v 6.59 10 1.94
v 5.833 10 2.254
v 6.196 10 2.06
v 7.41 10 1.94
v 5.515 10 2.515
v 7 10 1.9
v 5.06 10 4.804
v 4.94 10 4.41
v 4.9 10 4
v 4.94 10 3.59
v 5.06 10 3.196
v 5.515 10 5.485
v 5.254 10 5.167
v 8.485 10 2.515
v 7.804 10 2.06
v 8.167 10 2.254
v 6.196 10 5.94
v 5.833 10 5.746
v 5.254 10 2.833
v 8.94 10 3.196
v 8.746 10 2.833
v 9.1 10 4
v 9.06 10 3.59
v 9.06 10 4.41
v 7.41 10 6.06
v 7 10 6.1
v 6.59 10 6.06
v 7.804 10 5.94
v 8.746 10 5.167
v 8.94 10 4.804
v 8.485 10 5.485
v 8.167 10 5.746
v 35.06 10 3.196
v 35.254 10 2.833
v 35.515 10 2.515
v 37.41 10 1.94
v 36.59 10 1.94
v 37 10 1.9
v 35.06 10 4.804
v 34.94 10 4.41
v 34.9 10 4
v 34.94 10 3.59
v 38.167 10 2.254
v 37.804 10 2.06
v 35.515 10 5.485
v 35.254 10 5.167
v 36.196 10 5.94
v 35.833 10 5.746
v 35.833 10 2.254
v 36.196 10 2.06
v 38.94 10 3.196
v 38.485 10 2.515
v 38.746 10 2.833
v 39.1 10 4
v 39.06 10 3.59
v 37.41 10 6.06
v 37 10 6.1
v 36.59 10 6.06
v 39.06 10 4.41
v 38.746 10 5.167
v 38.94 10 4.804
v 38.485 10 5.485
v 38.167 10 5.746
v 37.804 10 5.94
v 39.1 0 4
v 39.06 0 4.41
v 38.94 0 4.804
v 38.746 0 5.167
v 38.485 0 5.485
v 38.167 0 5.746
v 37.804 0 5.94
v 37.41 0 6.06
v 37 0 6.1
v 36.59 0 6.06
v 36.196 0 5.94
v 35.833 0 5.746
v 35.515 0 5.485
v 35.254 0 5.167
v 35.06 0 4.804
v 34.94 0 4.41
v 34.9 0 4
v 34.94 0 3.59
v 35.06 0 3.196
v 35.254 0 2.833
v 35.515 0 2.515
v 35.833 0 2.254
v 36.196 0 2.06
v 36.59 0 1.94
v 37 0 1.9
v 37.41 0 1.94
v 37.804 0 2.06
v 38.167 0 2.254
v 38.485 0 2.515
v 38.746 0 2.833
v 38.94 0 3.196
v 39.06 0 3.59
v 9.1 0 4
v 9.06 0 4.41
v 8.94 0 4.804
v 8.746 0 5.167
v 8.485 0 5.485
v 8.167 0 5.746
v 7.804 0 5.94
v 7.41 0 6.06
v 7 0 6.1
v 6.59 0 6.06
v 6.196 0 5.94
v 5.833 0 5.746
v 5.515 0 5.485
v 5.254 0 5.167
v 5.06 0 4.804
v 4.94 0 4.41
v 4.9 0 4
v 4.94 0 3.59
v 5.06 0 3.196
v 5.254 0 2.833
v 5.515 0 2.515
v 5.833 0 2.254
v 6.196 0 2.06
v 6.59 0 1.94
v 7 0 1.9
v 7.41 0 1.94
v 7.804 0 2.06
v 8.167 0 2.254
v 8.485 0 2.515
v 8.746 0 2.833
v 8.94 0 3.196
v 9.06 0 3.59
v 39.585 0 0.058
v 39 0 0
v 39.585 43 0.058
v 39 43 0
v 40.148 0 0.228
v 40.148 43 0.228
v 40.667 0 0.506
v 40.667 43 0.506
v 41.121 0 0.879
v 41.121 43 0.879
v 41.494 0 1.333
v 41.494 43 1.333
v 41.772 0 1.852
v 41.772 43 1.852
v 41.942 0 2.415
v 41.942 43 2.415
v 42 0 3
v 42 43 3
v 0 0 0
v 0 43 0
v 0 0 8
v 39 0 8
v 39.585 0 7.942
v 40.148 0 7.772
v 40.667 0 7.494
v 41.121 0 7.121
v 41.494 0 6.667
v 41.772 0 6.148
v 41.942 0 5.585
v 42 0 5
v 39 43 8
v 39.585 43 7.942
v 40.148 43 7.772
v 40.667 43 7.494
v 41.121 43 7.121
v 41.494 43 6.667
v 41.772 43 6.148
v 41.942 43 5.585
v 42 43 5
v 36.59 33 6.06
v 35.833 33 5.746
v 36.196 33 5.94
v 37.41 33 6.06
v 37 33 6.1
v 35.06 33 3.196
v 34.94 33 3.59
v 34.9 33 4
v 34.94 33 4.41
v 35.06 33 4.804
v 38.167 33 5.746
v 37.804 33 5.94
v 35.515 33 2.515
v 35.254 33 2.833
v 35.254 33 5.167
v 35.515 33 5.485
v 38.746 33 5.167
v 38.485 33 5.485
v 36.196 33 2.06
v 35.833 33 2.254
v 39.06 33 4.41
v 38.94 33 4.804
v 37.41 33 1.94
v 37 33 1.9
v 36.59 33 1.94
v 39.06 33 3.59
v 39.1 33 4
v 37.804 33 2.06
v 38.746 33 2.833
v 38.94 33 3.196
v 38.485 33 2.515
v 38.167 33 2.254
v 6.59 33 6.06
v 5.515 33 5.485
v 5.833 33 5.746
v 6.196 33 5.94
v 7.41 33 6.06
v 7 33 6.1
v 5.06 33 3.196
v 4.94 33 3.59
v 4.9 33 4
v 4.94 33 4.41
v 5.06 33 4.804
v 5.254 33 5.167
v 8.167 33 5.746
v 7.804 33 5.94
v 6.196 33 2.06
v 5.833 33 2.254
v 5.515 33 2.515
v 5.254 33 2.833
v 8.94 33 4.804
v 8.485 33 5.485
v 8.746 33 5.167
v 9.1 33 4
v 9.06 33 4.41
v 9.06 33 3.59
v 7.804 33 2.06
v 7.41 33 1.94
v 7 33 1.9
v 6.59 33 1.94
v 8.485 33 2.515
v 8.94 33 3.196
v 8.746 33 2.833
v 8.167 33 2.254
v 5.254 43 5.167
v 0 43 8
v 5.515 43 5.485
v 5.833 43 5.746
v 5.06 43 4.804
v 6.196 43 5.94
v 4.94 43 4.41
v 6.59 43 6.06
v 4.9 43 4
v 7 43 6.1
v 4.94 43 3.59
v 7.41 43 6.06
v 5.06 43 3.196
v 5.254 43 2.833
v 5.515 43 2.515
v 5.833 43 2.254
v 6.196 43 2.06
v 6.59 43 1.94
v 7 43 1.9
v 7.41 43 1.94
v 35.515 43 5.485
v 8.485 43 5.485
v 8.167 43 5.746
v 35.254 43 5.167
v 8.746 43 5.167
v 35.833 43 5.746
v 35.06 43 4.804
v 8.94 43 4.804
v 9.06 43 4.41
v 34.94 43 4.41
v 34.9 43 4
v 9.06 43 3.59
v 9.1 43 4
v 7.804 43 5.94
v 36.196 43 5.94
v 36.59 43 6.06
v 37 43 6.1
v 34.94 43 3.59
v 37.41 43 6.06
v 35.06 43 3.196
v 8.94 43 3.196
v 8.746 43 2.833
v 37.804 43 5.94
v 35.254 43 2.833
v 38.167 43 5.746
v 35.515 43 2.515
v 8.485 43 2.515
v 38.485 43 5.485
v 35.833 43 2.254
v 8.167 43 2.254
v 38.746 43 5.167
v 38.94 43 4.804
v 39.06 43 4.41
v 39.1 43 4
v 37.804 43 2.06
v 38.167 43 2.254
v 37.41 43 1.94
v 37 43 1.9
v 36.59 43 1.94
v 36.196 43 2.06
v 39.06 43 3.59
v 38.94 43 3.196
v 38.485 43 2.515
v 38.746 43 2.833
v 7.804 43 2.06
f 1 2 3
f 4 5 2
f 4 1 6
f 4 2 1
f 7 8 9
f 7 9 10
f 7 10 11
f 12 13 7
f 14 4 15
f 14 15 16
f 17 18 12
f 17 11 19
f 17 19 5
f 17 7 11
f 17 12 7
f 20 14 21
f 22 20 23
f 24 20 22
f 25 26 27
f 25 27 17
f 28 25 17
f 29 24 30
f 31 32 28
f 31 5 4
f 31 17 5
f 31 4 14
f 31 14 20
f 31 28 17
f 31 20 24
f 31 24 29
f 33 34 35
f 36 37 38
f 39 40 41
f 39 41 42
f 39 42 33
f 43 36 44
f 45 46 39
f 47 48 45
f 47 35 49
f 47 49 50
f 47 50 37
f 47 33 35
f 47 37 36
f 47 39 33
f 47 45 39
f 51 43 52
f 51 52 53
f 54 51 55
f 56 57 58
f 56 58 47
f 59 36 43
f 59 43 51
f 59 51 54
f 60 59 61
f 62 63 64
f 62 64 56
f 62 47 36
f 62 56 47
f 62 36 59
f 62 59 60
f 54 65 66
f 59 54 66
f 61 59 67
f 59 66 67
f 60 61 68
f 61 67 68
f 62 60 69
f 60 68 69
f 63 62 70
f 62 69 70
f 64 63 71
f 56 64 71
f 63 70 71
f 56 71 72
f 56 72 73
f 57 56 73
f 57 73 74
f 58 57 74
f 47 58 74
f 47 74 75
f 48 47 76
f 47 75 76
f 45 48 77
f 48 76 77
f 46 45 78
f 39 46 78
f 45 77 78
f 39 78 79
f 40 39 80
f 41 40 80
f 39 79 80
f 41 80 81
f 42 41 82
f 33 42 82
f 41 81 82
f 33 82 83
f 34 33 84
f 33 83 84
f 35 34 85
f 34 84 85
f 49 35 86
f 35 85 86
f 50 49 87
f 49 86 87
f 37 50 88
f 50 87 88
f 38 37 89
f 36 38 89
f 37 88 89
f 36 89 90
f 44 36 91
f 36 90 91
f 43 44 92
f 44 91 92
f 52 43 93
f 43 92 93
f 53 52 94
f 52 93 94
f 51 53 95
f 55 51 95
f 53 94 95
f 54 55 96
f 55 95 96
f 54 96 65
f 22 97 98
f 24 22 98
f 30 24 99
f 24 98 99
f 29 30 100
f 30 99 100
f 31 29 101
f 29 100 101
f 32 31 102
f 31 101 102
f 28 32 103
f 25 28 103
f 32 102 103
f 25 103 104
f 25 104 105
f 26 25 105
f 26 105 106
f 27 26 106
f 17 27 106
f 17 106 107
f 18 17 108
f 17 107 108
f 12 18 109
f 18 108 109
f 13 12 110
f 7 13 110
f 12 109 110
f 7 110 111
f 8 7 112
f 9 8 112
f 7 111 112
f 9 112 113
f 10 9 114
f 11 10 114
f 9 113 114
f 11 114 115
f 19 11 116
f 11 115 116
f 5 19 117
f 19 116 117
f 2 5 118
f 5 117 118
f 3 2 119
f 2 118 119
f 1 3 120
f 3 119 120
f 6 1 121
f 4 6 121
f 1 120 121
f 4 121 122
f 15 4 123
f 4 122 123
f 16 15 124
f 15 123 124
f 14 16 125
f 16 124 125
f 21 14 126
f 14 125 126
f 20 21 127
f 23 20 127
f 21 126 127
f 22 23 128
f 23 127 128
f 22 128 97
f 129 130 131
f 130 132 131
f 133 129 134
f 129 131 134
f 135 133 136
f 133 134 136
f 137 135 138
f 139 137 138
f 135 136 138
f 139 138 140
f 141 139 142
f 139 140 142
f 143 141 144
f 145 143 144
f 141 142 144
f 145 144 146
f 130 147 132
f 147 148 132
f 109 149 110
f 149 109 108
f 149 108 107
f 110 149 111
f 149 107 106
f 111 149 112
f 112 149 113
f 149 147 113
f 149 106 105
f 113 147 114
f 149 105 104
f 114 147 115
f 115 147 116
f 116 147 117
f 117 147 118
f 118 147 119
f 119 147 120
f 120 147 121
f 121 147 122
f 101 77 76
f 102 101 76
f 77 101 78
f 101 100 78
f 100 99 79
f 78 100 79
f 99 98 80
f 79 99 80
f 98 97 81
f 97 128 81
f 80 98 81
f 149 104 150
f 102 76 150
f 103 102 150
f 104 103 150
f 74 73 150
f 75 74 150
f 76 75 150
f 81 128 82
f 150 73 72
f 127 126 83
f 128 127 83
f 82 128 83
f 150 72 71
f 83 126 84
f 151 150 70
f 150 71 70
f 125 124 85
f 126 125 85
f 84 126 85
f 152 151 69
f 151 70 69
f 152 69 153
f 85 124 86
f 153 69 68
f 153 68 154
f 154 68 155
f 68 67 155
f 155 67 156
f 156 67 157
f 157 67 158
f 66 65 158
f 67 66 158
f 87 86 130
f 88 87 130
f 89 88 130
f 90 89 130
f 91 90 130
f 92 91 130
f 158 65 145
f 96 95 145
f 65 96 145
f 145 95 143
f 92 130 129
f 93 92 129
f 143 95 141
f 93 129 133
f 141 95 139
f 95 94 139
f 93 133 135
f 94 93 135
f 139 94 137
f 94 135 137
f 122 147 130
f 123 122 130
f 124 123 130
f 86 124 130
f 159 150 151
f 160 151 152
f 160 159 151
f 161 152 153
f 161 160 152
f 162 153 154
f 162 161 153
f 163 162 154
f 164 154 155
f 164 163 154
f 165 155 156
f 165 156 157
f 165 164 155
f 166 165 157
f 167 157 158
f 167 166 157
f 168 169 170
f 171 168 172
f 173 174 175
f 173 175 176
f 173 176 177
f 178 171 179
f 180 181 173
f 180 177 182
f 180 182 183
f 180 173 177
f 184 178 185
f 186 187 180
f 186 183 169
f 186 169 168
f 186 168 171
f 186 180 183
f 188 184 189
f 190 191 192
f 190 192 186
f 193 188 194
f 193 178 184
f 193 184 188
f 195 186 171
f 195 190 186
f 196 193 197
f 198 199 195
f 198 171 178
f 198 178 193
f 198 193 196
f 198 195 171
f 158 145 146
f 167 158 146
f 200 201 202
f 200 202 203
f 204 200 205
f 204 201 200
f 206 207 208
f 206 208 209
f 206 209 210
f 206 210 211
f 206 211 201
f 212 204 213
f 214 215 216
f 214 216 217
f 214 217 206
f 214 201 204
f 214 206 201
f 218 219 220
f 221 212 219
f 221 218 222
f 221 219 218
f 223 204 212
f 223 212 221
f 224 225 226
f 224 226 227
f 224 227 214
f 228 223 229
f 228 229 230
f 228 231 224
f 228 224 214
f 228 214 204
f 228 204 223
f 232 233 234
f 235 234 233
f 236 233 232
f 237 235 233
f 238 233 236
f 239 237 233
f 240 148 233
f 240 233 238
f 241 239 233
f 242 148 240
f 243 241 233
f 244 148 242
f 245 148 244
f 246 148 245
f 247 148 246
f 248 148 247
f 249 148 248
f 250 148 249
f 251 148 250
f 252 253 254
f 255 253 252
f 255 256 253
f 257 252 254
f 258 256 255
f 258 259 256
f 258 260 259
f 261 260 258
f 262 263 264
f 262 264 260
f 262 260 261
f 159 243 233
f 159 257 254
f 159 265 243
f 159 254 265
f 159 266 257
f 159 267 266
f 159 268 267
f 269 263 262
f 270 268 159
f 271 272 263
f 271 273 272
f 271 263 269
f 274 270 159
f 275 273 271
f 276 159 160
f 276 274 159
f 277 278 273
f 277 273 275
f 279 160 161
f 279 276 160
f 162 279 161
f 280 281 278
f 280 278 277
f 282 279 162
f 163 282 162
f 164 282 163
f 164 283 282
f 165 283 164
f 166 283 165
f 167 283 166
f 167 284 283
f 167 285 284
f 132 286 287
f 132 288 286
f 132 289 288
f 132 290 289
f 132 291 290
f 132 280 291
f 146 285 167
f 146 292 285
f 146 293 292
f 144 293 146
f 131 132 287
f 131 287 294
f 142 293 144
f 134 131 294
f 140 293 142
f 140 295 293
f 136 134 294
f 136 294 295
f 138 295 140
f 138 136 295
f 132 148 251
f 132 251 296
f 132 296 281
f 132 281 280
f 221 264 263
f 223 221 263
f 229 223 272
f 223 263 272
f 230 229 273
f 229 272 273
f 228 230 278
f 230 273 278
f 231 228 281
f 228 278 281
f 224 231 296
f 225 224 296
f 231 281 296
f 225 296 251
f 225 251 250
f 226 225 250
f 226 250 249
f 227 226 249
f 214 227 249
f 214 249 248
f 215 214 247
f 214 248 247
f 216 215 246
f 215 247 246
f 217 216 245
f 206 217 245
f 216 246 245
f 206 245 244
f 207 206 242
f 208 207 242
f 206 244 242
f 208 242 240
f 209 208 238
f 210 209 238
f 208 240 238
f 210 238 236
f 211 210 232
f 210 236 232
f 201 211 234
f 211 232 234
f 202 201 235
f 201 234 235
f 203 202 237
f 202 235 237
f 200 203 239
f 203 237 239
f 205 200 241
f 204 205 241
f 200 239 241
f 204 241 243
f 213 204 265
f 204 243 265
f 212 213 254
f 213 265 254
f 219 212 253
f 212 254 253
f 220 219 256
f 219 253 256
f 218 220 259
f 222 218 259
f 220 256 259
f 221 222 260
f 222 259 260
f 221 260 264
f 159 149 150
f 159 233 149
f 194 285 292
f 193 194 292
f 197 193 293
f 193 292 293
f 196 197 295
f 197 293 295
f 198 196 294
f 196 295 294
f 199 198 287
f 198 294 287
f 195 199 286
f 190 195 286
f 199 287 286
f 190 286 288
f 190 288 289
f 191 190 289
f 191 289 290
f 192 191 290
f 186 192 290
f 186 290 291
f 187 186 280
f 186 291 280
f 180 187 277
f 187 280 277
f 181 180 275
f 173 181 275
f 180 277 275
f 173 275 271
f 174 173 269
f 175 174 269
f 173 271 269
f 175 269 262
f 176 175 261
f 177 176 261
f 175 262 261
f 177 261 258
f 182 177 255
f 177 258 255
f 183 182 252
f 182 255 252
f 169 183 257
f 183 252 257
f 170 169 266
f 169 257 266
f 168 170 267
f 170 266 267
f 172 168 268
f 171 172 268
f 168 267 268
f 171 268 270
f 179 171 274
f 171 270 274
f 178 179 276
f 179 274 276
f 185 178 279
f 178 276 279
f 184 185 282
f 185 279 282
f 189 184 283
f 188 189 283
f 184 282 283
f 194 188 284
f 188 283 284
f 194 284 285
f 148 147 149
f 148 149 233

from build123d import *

# Parameters (mm, degrees)
SKETCH1_W           = 42
SKETCH1_H           = 43
BOSS_EXTRUDE1_DEPTH = 8
SKETCH2_R           = 2.1
CUT_EXTRUDE1_DEPTH  = 10
SKETCH3_R           = 2.1
CUT_EXTRUDE2_DEPTH  = 10
FILLET1_R           = 3


with BuildPart() as part:
    # Sketch1 → Boss-Extrude1 (new body)
    with BuildSketch(Plane.XY):
        with Locations((21, 21.5)):
            Rectangle(SKETCH1_W, SKETCH1_H)
    extrude(amount=BOSS_EXTRUDE1_DEPTH)

    # Sketch2 → Cut-Extrude1 (cut)
    with BuildSketch(Plane.XZ):
        with Locations((37, 4)):
            Circle(SKETCH2_R)
        with Locations((7, 4)):
            Circle(SKETCH2_R)
    extrude(amount=-CUT_EXTRUDE1_DEPTH, mode=Mode.SUBTRACT)

    # Sketch3 → Cut-Extrude2 (cut)
    with BuildSketch(Plane(origin=(0, 43, 0), x_dir=(1, 0, 0), z_dir=(0, 1, 0))):
        with Locations((37, -4)):
            Circle(SKETCH3_R)
        with Locations((7, -4)):
            Circle(SKETCH3_R)
    extrude(amount=-CUT_EXTRUDE2_DEPTH, mode=Mode.SUBTRACT)

    # Fillet1
    fillet1_edges = [part.edges().sort_by_distance(p)[0] for p in [
        (42, 21.5, 8),
        (42, 21.5, 0),
    ]]
    fillet(fillet1_edges, radius=FILLET1_R)


solid = part.part
